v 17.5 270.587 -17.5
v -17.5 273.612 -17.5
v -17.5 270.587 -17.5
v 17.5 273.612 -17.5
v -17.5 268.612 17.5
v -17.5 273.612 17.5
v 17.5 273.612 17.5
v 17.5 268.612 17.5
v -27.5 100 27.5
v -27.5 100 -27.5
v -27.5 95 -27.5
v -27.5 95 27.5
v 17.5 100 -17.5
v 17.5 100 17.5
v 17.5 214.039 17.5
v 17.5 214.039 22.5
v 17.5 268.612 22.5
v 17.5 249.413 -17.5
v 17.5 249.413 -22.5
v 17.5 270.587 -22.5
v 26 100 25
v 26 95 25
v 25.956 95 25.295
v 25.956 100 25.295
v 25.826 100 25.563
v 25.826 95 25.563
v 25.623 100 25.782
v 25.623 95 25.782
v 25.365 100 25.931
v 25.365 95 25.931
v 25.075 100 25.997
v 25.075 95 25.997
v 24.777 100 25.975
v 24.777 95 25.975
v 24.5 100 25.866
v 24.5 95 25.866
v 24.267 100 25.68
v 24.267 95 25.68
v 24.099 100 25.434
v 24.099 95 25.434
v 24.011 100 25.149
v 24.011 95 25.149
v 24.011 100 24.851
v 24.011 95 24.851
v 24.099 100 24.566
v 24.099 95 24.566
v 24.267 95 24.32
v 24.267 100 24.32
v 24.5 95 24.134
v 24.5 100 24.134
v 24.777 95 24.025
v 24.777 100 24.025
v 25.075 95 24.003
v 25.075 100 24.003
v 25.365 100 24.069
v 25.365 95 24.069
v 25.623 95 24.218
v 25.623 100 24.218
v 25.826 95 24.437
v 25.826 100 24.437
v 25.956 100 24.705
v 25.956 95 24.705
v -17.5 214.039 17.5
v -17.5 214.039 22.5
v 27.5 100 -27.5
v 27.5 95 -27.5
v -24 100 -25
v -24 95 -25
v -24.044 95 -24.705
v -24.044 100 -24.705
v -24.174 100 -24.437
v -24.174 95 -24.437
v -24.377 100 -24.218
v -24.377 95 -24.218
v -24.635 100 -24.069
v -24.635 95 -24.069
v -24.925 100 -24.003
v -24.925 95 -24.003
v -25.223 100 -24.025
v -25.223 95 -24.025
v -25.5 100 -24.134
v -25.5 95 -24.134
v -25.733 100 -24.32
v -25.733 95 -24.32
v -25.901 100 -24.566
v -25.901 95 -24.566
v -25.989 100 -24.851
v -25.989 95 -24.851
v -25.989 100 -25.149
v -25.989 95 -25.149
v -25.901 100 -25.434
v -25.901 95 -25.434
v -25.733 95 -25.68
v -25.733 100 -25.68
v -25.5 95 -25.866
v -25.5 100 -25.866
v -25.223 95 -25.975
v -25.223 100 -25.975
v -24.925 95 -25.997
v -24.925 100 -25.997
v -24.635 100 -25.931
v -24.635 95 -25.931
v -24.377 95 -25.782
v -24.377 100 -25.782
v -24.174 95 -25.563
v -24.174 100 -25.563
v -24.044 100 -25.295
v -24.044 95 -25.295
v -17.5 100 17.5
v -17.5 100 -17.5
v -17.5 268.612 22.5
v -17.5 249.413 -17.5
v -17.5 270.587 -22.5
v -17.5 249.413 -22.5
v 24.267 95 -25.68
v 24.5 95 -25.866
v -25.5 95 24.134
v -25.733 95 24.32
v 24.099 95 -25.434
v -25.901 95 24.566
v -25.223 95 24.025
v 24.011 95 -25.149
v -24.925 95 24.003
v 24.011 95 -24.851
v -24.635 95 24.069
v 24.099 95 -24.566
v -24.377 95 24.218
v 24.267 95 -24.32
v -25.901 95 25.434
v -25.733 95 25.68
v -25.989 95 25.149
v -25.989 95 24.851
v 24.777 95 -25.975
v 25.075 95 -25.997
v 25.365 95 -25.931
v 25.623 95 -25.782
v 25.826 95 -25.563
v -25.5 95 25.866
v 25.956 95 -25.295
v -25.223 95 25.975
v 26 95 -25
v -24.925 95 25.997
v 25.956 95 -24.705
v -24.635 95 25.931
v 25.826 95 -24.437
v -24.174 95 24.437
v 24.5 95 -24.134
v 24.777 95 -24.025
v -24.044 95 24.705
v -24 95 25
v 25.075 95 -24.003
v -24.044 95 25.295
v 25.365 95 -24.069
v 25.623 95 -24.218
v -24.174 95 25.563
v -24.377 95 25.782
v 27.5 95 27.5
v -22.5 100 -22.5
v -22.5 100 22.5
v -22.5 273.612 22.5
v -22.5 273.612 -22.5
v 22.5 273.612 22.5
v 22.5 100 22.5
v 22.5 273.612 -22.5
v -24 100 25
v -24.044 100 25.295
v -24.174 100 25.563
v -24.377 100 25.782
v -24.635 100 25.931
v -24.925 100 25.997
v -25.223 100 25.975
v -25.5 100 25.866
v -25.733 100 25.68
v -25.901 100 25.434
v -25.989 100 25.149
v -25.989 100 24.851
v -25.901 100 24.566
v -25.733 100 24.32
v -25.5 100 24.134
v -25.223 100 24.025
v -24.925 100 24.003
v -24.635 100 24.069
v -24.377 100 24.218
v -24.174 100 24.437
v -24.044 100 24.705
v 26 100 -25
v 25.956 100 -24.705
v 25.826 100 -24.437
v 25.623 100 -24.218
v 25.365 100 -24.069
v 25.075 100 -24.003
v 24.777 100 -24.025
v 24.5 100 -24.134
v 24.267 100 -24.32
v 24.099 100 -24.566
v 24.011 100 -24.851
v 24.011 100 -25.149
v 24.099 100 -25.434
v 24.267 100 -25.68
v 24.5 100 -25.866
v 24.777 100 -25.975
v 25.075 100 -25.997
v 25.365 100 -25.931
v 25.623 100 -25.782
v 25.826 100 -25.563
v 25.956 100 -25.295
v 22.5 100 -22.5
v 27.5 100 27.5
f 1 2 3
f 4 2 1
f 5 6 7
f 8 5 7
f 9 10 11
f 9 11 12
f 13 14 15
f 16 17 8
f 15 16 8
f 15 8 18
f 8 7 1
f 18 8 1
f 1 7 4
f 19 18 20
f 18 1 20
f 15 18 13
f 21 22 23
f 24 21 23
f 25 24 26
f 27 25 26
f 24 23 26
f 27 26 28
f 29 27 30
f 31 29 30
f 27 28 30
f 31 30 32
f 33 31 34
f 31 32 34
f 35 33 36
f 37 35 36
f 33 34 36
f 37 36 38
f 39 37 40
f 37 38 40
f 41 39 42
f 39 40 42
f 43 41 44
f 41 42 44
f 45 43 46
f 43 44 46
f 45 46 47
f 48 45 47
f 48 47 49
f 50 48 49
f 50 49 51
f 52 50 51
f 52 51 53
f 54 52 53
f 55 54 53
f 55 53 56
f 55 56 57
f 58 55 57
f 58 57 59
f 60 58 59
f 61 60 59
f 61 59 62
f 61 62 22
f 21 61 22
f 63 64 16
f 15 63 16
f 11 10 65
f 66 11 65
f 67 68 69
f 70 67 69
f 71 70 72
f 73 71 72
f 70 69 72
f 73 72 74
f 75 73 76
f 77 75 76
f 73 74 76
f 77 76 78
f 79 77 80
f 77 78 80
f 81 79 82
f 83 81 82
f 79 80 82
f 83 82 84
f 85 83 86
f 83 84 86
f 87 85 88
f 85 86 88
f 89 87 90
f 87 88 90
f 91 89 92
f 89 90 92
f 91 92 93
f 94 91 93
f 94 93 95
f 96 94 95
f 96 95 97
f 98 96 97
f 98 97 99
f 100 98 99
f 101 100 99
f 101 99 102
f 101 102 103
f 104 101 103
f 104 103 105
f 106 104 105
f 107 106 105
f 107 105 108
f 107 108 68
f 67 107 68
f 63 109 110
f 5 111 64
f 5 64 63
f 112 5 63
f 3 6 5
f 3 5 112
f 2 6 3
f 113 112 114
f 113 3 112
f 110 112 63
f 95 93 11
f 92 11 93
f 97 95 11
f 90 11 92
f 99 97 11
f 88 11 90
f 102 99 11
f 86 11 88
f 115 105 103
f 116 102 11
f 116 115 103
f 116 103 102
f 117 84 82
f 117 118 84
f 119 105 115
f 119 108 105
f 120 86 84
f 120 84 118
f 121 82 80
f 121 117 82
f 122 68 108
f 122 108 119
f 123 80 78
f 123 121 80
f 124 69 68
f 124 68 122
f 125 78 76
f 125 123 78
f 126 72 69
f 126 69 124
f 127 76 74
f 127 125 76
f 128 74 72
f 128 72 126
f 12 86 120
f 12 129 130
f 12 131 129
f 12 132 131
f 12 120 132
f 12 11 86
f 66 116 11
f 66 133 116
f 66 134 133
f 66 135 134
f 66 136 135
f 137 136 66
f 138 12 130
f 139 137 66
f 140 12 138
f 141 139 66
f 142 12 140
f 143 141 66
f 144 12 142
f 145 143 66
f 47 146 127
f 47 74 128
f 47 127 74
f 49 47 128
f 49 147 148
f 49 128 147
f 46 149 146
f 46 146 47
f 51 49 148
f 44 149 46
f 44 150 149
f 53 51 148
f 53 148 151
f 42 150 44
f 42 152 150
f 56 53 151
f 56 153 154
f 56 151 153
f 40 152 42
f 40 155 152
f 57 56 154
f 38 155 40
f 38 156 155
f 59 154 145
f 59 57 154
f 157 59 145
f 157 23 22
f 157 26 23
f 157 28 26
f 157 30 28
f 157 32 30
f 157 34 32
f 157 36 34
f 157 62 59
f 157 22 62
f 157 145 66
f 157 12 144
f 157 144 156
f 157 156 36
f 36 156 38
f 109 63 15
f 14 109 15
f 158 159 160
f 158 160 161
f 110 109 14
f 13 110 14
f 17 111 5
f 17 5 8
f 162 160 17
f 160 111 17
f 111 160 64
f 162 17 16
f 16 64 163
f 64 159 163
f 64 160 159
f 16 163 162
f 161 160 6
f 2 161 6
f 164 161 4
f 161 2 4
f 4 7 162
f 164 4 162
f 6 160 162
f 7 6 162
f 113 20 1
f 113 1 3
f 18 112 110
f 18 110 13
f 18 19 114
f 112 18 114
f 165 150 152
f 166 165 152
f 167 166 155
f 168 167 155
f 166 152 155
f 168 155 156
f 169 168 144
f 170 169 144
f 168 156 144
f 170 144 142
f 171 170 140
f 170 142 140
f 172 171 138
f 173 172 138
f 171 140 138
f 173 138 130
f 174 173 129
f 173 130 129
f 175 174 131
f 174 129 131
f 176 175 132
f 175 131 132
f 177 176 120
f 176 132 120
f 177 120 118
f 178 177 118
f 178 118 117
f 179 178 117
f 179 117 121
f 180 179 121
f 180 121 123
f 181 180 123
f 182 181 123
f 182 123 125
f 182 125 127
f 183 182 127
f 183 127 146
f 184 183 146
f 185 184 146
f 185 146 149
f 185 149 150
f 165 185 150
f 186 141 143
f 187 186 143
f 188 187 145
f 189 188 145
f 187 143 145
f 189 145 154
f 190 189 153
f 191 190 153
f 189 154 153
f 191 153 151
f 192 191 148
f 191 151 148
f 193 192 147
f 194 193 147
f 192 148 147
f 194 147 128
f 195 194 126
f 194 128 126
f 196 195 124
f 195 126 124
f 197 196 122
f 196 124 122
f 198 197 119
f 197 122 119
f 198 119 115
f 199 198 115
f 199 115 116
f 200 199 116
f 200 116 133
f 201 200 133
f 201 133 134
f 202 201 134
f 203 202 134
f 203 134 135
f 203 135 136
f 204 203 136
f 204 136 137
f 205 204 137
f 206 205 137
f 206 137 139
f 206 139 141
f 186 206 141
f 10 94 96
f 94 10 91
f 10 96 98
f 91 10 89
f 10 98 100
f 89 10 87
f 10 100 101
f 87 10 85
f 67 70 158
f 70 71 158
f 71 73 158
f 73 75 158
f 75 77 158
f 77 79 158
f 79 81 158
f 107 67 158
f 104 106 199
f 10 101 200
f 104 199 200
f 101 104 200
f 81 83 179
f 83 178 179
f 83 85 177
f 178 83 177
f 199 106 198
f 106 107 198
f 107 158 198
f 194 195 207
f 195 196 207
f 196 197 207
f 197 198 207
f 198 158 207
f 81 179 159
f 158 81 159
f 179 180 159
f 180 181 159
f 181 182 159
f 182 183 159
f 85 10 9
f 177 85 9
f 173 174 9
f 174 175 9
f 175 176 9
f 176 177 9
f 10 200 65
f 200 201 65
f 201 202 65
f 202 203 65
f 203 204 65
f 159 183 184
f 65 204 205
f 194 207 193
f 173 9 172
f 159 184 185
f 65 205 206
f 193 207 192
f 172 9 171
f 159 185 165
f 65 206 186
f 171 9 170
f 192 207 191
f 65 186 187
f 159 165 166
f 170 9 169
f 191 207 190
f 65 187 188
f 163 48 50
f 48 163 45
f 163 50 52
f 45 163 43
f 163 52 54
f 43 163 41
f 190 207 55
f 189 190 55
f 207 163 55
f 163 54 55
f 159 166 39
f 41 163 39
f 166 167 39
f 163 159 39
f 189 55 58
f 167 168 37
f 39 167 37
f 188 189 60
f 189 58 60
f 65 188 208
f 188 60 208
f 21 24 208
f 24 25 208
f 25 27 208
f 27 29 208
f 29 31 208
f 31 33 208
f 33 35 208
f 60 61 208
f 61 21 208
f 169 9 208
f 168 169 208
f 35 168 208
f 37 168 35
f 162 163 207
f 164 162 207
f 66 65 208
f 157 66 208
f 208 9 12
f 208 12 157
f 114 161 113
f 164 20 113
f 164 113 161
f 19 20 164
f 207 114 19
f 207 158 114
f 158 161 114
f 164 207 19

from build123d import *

# Parameters (mm, degrees)
CROQUIS1_W                 = 45
CROQUIS1_H                 = 45
SALIENTE_EXTRUIR1_DEPTH    = 300
CROQUIS4_W                 = 18
CROQUIS4_H                 = 34
CORTAR_EXTRUIR2_DEPTH      = 46
CROQUIS8_W                 = 35
CROQUIS8_H                 = 35
CORTAR_EXTRUIR3_DEPTH      = 301
CROQUIS9_W                 = 35
CROQUIS9_H                 = 21.174410022
CORTAR_EXTRUIR4_DEPTH      = 10
CROQUIS10_R                = 1
CORTAR_EXTRUIR5_DEPTH      = 10
CROQUIS17_W                = 35
CROQUIS17_H                = 54.573397986
CORTAR_EXTRUIR9_DEPTH      = 10
CROQUIS11_W                = 45
CROQUIS11_H                = 26.387879272
CORTAR_EXTRUIR6_DEPTH      = 46
CROQUIS13_W                = 45
CROQUIS13_H                = 100
CORTAR_EXTRUIR7_DEPTH      = 23.5
CORTAR_EXTRUIR7_DEPTH_BACK = 23.5
CROQUIS14_W                = 55
CROQUIS14_H                = 55
SALIENTE_EXTRUIR2_DEPTH    = 5
CROQUIS16_R                = 1
CORTAR_EXTRUIR8_DEPTH      = 1
CORTAR_EXTRUIR8_DEPTH_BACK = 179.612120728


with BuildPart() as part:
    # Croquis1 → Saliente-Extruir1 (new body)
    with BuildSketch(Plane(origin=(0, 0, 0), x_dir=(1, 0, 0), z_dir=(0, 1, 0))):
        Rectangle(CROQUIS1_W, CROQUIS1_H)
    extrude(amount=SALIENTE_EXTRUIR1_DEPTH)

    # Croquis4 → Cortar-Extruir2 (cut, through all)
    with BuildSketch(Plane.ZY.offset(22.5)):
        with Locations((13.5, 17)):
            Rectangle(CROQUIS4_W, CROQUIS4_H)
    extrude(amount=-CORTAR_EXTRUIR2_DEPTH, mode=Mode.SUBTRACT)

    # Croquis8 → Cortar-Extruir3 (cut, through all)
    with BuildSketch(Plane(origin=(0, 300, 0), x_dir=(1, 0, 0), z_dir=(0, 1, 0))):
        Rectangle(CROQUIS8_W, CROQUIS8_H)
    extrude(amount=-CORTAR_EXTRUIR3_DEPTH, mode=Mode.SUBTRACT)

    # Croquis9 → Cortar-Extruir4 (cut)
    with BuildSketch(Plane(origin=(0, 0, -22.5), x_dir=(-1, 0, 0), z_dir=(0, 0, -1))):
        with Locations((0, 260)):
            Rectangle(CROQUIS9_W, CROQUIS9_H)
    extrude(amount=-CORTAR_EXTRUIR4_DEPTH, mode=Mode.SUBTRACT)

    # Croquis10 → Cortar-Extruir5 (cut)
    with BuildSketch(Plane.XY.offset(22.5)):
        with Locations((0, 260)):
            Circle(CROQUIS10_R)
    extrude(amount=-CORTAR_EXTRUIR5_DEPTH, mode=Mode.SUBTRACT)

    # Croquis17 → Cortar-Extruir9 (cut)
    with BuildSketch(Plane.XY.offset(22.5)):
        with Locations((0, 241.325421735)):
            Rectangle(CROQUIS17_W, CROQUIS17_H)
    extrude(amount=-CORTAR_EXTRUIR9_DEPTH, mode=Mode.SUBTRACT)

    # Croquis11 → Cortar-Extruir6 (cut, through all)
    with BuildSketch(Plane.XY.offset(22.5)):
        with Locations((0, 286.806060364)):
            Rectangle(CROQUIS11_W, CROQUIS11_H)
    extrude(amount=-CORTAR_EXTRUIR6_DEPTH, mode=Mode.SUBTRACT)

    # Croquis13 → Cortar-Extruir7 (cut, two sides)
    with BuildSketch(Plane(origin=(0, 0, 0), x_dir=(0, 0, -1), z_dir=(1, 0, 0))) as cortar_extruir7_sk:
        with Locations((0, 50)):
            Rectangle(CROQUIS13_W, CROQUIS13_H)
    extrude(amount=CORTAR_EXTRUIR7_DEPTH, mode=Mode.SUBTRACT)
    extrude(cortar_extruir7_sk.sketch, amount=-CORTAR_EXTRUIR7_DEPTH_BACK, mode=Mode.SUBTRACT)

    # Croquis14 → Saliente-Extruir2 (add)
    with BuildSketch(Plane.XZ.offset(-100)):
        Rectangle(CROQUIS14_W, CROQUIS14_H)
    extrude(amount=SALIENTE_EXTRUIR2_DEPTH)

    # Croquis16 → Cortar-Extruir8 (cut, two sides)
    with BuildSketch(Plane.XZ.offset(-95)) as cortar_extruir8_sk:
        with Locations((25, 25)):
            Circle(CROQUIS16_R)
        with Locations((-25, 25)):
            Circle(CROQUIS16_R)
        with Locations((-25, -25)):
            Circle(CROQUIS16_R)
        with Locations((25, -25)):
            Circle(CROQUIS16_R)
    extrude(amount=CORTAR_EXTRUIR8_DEPTH, mode=Mode.SUBTRACT)
    extrude(cortar_extruir8_sk.sketch, amount=-CORTAR_EXTRUIR8_DEPTH_BACK, mode=Mode.SUBTRACT)


solid = part.part
